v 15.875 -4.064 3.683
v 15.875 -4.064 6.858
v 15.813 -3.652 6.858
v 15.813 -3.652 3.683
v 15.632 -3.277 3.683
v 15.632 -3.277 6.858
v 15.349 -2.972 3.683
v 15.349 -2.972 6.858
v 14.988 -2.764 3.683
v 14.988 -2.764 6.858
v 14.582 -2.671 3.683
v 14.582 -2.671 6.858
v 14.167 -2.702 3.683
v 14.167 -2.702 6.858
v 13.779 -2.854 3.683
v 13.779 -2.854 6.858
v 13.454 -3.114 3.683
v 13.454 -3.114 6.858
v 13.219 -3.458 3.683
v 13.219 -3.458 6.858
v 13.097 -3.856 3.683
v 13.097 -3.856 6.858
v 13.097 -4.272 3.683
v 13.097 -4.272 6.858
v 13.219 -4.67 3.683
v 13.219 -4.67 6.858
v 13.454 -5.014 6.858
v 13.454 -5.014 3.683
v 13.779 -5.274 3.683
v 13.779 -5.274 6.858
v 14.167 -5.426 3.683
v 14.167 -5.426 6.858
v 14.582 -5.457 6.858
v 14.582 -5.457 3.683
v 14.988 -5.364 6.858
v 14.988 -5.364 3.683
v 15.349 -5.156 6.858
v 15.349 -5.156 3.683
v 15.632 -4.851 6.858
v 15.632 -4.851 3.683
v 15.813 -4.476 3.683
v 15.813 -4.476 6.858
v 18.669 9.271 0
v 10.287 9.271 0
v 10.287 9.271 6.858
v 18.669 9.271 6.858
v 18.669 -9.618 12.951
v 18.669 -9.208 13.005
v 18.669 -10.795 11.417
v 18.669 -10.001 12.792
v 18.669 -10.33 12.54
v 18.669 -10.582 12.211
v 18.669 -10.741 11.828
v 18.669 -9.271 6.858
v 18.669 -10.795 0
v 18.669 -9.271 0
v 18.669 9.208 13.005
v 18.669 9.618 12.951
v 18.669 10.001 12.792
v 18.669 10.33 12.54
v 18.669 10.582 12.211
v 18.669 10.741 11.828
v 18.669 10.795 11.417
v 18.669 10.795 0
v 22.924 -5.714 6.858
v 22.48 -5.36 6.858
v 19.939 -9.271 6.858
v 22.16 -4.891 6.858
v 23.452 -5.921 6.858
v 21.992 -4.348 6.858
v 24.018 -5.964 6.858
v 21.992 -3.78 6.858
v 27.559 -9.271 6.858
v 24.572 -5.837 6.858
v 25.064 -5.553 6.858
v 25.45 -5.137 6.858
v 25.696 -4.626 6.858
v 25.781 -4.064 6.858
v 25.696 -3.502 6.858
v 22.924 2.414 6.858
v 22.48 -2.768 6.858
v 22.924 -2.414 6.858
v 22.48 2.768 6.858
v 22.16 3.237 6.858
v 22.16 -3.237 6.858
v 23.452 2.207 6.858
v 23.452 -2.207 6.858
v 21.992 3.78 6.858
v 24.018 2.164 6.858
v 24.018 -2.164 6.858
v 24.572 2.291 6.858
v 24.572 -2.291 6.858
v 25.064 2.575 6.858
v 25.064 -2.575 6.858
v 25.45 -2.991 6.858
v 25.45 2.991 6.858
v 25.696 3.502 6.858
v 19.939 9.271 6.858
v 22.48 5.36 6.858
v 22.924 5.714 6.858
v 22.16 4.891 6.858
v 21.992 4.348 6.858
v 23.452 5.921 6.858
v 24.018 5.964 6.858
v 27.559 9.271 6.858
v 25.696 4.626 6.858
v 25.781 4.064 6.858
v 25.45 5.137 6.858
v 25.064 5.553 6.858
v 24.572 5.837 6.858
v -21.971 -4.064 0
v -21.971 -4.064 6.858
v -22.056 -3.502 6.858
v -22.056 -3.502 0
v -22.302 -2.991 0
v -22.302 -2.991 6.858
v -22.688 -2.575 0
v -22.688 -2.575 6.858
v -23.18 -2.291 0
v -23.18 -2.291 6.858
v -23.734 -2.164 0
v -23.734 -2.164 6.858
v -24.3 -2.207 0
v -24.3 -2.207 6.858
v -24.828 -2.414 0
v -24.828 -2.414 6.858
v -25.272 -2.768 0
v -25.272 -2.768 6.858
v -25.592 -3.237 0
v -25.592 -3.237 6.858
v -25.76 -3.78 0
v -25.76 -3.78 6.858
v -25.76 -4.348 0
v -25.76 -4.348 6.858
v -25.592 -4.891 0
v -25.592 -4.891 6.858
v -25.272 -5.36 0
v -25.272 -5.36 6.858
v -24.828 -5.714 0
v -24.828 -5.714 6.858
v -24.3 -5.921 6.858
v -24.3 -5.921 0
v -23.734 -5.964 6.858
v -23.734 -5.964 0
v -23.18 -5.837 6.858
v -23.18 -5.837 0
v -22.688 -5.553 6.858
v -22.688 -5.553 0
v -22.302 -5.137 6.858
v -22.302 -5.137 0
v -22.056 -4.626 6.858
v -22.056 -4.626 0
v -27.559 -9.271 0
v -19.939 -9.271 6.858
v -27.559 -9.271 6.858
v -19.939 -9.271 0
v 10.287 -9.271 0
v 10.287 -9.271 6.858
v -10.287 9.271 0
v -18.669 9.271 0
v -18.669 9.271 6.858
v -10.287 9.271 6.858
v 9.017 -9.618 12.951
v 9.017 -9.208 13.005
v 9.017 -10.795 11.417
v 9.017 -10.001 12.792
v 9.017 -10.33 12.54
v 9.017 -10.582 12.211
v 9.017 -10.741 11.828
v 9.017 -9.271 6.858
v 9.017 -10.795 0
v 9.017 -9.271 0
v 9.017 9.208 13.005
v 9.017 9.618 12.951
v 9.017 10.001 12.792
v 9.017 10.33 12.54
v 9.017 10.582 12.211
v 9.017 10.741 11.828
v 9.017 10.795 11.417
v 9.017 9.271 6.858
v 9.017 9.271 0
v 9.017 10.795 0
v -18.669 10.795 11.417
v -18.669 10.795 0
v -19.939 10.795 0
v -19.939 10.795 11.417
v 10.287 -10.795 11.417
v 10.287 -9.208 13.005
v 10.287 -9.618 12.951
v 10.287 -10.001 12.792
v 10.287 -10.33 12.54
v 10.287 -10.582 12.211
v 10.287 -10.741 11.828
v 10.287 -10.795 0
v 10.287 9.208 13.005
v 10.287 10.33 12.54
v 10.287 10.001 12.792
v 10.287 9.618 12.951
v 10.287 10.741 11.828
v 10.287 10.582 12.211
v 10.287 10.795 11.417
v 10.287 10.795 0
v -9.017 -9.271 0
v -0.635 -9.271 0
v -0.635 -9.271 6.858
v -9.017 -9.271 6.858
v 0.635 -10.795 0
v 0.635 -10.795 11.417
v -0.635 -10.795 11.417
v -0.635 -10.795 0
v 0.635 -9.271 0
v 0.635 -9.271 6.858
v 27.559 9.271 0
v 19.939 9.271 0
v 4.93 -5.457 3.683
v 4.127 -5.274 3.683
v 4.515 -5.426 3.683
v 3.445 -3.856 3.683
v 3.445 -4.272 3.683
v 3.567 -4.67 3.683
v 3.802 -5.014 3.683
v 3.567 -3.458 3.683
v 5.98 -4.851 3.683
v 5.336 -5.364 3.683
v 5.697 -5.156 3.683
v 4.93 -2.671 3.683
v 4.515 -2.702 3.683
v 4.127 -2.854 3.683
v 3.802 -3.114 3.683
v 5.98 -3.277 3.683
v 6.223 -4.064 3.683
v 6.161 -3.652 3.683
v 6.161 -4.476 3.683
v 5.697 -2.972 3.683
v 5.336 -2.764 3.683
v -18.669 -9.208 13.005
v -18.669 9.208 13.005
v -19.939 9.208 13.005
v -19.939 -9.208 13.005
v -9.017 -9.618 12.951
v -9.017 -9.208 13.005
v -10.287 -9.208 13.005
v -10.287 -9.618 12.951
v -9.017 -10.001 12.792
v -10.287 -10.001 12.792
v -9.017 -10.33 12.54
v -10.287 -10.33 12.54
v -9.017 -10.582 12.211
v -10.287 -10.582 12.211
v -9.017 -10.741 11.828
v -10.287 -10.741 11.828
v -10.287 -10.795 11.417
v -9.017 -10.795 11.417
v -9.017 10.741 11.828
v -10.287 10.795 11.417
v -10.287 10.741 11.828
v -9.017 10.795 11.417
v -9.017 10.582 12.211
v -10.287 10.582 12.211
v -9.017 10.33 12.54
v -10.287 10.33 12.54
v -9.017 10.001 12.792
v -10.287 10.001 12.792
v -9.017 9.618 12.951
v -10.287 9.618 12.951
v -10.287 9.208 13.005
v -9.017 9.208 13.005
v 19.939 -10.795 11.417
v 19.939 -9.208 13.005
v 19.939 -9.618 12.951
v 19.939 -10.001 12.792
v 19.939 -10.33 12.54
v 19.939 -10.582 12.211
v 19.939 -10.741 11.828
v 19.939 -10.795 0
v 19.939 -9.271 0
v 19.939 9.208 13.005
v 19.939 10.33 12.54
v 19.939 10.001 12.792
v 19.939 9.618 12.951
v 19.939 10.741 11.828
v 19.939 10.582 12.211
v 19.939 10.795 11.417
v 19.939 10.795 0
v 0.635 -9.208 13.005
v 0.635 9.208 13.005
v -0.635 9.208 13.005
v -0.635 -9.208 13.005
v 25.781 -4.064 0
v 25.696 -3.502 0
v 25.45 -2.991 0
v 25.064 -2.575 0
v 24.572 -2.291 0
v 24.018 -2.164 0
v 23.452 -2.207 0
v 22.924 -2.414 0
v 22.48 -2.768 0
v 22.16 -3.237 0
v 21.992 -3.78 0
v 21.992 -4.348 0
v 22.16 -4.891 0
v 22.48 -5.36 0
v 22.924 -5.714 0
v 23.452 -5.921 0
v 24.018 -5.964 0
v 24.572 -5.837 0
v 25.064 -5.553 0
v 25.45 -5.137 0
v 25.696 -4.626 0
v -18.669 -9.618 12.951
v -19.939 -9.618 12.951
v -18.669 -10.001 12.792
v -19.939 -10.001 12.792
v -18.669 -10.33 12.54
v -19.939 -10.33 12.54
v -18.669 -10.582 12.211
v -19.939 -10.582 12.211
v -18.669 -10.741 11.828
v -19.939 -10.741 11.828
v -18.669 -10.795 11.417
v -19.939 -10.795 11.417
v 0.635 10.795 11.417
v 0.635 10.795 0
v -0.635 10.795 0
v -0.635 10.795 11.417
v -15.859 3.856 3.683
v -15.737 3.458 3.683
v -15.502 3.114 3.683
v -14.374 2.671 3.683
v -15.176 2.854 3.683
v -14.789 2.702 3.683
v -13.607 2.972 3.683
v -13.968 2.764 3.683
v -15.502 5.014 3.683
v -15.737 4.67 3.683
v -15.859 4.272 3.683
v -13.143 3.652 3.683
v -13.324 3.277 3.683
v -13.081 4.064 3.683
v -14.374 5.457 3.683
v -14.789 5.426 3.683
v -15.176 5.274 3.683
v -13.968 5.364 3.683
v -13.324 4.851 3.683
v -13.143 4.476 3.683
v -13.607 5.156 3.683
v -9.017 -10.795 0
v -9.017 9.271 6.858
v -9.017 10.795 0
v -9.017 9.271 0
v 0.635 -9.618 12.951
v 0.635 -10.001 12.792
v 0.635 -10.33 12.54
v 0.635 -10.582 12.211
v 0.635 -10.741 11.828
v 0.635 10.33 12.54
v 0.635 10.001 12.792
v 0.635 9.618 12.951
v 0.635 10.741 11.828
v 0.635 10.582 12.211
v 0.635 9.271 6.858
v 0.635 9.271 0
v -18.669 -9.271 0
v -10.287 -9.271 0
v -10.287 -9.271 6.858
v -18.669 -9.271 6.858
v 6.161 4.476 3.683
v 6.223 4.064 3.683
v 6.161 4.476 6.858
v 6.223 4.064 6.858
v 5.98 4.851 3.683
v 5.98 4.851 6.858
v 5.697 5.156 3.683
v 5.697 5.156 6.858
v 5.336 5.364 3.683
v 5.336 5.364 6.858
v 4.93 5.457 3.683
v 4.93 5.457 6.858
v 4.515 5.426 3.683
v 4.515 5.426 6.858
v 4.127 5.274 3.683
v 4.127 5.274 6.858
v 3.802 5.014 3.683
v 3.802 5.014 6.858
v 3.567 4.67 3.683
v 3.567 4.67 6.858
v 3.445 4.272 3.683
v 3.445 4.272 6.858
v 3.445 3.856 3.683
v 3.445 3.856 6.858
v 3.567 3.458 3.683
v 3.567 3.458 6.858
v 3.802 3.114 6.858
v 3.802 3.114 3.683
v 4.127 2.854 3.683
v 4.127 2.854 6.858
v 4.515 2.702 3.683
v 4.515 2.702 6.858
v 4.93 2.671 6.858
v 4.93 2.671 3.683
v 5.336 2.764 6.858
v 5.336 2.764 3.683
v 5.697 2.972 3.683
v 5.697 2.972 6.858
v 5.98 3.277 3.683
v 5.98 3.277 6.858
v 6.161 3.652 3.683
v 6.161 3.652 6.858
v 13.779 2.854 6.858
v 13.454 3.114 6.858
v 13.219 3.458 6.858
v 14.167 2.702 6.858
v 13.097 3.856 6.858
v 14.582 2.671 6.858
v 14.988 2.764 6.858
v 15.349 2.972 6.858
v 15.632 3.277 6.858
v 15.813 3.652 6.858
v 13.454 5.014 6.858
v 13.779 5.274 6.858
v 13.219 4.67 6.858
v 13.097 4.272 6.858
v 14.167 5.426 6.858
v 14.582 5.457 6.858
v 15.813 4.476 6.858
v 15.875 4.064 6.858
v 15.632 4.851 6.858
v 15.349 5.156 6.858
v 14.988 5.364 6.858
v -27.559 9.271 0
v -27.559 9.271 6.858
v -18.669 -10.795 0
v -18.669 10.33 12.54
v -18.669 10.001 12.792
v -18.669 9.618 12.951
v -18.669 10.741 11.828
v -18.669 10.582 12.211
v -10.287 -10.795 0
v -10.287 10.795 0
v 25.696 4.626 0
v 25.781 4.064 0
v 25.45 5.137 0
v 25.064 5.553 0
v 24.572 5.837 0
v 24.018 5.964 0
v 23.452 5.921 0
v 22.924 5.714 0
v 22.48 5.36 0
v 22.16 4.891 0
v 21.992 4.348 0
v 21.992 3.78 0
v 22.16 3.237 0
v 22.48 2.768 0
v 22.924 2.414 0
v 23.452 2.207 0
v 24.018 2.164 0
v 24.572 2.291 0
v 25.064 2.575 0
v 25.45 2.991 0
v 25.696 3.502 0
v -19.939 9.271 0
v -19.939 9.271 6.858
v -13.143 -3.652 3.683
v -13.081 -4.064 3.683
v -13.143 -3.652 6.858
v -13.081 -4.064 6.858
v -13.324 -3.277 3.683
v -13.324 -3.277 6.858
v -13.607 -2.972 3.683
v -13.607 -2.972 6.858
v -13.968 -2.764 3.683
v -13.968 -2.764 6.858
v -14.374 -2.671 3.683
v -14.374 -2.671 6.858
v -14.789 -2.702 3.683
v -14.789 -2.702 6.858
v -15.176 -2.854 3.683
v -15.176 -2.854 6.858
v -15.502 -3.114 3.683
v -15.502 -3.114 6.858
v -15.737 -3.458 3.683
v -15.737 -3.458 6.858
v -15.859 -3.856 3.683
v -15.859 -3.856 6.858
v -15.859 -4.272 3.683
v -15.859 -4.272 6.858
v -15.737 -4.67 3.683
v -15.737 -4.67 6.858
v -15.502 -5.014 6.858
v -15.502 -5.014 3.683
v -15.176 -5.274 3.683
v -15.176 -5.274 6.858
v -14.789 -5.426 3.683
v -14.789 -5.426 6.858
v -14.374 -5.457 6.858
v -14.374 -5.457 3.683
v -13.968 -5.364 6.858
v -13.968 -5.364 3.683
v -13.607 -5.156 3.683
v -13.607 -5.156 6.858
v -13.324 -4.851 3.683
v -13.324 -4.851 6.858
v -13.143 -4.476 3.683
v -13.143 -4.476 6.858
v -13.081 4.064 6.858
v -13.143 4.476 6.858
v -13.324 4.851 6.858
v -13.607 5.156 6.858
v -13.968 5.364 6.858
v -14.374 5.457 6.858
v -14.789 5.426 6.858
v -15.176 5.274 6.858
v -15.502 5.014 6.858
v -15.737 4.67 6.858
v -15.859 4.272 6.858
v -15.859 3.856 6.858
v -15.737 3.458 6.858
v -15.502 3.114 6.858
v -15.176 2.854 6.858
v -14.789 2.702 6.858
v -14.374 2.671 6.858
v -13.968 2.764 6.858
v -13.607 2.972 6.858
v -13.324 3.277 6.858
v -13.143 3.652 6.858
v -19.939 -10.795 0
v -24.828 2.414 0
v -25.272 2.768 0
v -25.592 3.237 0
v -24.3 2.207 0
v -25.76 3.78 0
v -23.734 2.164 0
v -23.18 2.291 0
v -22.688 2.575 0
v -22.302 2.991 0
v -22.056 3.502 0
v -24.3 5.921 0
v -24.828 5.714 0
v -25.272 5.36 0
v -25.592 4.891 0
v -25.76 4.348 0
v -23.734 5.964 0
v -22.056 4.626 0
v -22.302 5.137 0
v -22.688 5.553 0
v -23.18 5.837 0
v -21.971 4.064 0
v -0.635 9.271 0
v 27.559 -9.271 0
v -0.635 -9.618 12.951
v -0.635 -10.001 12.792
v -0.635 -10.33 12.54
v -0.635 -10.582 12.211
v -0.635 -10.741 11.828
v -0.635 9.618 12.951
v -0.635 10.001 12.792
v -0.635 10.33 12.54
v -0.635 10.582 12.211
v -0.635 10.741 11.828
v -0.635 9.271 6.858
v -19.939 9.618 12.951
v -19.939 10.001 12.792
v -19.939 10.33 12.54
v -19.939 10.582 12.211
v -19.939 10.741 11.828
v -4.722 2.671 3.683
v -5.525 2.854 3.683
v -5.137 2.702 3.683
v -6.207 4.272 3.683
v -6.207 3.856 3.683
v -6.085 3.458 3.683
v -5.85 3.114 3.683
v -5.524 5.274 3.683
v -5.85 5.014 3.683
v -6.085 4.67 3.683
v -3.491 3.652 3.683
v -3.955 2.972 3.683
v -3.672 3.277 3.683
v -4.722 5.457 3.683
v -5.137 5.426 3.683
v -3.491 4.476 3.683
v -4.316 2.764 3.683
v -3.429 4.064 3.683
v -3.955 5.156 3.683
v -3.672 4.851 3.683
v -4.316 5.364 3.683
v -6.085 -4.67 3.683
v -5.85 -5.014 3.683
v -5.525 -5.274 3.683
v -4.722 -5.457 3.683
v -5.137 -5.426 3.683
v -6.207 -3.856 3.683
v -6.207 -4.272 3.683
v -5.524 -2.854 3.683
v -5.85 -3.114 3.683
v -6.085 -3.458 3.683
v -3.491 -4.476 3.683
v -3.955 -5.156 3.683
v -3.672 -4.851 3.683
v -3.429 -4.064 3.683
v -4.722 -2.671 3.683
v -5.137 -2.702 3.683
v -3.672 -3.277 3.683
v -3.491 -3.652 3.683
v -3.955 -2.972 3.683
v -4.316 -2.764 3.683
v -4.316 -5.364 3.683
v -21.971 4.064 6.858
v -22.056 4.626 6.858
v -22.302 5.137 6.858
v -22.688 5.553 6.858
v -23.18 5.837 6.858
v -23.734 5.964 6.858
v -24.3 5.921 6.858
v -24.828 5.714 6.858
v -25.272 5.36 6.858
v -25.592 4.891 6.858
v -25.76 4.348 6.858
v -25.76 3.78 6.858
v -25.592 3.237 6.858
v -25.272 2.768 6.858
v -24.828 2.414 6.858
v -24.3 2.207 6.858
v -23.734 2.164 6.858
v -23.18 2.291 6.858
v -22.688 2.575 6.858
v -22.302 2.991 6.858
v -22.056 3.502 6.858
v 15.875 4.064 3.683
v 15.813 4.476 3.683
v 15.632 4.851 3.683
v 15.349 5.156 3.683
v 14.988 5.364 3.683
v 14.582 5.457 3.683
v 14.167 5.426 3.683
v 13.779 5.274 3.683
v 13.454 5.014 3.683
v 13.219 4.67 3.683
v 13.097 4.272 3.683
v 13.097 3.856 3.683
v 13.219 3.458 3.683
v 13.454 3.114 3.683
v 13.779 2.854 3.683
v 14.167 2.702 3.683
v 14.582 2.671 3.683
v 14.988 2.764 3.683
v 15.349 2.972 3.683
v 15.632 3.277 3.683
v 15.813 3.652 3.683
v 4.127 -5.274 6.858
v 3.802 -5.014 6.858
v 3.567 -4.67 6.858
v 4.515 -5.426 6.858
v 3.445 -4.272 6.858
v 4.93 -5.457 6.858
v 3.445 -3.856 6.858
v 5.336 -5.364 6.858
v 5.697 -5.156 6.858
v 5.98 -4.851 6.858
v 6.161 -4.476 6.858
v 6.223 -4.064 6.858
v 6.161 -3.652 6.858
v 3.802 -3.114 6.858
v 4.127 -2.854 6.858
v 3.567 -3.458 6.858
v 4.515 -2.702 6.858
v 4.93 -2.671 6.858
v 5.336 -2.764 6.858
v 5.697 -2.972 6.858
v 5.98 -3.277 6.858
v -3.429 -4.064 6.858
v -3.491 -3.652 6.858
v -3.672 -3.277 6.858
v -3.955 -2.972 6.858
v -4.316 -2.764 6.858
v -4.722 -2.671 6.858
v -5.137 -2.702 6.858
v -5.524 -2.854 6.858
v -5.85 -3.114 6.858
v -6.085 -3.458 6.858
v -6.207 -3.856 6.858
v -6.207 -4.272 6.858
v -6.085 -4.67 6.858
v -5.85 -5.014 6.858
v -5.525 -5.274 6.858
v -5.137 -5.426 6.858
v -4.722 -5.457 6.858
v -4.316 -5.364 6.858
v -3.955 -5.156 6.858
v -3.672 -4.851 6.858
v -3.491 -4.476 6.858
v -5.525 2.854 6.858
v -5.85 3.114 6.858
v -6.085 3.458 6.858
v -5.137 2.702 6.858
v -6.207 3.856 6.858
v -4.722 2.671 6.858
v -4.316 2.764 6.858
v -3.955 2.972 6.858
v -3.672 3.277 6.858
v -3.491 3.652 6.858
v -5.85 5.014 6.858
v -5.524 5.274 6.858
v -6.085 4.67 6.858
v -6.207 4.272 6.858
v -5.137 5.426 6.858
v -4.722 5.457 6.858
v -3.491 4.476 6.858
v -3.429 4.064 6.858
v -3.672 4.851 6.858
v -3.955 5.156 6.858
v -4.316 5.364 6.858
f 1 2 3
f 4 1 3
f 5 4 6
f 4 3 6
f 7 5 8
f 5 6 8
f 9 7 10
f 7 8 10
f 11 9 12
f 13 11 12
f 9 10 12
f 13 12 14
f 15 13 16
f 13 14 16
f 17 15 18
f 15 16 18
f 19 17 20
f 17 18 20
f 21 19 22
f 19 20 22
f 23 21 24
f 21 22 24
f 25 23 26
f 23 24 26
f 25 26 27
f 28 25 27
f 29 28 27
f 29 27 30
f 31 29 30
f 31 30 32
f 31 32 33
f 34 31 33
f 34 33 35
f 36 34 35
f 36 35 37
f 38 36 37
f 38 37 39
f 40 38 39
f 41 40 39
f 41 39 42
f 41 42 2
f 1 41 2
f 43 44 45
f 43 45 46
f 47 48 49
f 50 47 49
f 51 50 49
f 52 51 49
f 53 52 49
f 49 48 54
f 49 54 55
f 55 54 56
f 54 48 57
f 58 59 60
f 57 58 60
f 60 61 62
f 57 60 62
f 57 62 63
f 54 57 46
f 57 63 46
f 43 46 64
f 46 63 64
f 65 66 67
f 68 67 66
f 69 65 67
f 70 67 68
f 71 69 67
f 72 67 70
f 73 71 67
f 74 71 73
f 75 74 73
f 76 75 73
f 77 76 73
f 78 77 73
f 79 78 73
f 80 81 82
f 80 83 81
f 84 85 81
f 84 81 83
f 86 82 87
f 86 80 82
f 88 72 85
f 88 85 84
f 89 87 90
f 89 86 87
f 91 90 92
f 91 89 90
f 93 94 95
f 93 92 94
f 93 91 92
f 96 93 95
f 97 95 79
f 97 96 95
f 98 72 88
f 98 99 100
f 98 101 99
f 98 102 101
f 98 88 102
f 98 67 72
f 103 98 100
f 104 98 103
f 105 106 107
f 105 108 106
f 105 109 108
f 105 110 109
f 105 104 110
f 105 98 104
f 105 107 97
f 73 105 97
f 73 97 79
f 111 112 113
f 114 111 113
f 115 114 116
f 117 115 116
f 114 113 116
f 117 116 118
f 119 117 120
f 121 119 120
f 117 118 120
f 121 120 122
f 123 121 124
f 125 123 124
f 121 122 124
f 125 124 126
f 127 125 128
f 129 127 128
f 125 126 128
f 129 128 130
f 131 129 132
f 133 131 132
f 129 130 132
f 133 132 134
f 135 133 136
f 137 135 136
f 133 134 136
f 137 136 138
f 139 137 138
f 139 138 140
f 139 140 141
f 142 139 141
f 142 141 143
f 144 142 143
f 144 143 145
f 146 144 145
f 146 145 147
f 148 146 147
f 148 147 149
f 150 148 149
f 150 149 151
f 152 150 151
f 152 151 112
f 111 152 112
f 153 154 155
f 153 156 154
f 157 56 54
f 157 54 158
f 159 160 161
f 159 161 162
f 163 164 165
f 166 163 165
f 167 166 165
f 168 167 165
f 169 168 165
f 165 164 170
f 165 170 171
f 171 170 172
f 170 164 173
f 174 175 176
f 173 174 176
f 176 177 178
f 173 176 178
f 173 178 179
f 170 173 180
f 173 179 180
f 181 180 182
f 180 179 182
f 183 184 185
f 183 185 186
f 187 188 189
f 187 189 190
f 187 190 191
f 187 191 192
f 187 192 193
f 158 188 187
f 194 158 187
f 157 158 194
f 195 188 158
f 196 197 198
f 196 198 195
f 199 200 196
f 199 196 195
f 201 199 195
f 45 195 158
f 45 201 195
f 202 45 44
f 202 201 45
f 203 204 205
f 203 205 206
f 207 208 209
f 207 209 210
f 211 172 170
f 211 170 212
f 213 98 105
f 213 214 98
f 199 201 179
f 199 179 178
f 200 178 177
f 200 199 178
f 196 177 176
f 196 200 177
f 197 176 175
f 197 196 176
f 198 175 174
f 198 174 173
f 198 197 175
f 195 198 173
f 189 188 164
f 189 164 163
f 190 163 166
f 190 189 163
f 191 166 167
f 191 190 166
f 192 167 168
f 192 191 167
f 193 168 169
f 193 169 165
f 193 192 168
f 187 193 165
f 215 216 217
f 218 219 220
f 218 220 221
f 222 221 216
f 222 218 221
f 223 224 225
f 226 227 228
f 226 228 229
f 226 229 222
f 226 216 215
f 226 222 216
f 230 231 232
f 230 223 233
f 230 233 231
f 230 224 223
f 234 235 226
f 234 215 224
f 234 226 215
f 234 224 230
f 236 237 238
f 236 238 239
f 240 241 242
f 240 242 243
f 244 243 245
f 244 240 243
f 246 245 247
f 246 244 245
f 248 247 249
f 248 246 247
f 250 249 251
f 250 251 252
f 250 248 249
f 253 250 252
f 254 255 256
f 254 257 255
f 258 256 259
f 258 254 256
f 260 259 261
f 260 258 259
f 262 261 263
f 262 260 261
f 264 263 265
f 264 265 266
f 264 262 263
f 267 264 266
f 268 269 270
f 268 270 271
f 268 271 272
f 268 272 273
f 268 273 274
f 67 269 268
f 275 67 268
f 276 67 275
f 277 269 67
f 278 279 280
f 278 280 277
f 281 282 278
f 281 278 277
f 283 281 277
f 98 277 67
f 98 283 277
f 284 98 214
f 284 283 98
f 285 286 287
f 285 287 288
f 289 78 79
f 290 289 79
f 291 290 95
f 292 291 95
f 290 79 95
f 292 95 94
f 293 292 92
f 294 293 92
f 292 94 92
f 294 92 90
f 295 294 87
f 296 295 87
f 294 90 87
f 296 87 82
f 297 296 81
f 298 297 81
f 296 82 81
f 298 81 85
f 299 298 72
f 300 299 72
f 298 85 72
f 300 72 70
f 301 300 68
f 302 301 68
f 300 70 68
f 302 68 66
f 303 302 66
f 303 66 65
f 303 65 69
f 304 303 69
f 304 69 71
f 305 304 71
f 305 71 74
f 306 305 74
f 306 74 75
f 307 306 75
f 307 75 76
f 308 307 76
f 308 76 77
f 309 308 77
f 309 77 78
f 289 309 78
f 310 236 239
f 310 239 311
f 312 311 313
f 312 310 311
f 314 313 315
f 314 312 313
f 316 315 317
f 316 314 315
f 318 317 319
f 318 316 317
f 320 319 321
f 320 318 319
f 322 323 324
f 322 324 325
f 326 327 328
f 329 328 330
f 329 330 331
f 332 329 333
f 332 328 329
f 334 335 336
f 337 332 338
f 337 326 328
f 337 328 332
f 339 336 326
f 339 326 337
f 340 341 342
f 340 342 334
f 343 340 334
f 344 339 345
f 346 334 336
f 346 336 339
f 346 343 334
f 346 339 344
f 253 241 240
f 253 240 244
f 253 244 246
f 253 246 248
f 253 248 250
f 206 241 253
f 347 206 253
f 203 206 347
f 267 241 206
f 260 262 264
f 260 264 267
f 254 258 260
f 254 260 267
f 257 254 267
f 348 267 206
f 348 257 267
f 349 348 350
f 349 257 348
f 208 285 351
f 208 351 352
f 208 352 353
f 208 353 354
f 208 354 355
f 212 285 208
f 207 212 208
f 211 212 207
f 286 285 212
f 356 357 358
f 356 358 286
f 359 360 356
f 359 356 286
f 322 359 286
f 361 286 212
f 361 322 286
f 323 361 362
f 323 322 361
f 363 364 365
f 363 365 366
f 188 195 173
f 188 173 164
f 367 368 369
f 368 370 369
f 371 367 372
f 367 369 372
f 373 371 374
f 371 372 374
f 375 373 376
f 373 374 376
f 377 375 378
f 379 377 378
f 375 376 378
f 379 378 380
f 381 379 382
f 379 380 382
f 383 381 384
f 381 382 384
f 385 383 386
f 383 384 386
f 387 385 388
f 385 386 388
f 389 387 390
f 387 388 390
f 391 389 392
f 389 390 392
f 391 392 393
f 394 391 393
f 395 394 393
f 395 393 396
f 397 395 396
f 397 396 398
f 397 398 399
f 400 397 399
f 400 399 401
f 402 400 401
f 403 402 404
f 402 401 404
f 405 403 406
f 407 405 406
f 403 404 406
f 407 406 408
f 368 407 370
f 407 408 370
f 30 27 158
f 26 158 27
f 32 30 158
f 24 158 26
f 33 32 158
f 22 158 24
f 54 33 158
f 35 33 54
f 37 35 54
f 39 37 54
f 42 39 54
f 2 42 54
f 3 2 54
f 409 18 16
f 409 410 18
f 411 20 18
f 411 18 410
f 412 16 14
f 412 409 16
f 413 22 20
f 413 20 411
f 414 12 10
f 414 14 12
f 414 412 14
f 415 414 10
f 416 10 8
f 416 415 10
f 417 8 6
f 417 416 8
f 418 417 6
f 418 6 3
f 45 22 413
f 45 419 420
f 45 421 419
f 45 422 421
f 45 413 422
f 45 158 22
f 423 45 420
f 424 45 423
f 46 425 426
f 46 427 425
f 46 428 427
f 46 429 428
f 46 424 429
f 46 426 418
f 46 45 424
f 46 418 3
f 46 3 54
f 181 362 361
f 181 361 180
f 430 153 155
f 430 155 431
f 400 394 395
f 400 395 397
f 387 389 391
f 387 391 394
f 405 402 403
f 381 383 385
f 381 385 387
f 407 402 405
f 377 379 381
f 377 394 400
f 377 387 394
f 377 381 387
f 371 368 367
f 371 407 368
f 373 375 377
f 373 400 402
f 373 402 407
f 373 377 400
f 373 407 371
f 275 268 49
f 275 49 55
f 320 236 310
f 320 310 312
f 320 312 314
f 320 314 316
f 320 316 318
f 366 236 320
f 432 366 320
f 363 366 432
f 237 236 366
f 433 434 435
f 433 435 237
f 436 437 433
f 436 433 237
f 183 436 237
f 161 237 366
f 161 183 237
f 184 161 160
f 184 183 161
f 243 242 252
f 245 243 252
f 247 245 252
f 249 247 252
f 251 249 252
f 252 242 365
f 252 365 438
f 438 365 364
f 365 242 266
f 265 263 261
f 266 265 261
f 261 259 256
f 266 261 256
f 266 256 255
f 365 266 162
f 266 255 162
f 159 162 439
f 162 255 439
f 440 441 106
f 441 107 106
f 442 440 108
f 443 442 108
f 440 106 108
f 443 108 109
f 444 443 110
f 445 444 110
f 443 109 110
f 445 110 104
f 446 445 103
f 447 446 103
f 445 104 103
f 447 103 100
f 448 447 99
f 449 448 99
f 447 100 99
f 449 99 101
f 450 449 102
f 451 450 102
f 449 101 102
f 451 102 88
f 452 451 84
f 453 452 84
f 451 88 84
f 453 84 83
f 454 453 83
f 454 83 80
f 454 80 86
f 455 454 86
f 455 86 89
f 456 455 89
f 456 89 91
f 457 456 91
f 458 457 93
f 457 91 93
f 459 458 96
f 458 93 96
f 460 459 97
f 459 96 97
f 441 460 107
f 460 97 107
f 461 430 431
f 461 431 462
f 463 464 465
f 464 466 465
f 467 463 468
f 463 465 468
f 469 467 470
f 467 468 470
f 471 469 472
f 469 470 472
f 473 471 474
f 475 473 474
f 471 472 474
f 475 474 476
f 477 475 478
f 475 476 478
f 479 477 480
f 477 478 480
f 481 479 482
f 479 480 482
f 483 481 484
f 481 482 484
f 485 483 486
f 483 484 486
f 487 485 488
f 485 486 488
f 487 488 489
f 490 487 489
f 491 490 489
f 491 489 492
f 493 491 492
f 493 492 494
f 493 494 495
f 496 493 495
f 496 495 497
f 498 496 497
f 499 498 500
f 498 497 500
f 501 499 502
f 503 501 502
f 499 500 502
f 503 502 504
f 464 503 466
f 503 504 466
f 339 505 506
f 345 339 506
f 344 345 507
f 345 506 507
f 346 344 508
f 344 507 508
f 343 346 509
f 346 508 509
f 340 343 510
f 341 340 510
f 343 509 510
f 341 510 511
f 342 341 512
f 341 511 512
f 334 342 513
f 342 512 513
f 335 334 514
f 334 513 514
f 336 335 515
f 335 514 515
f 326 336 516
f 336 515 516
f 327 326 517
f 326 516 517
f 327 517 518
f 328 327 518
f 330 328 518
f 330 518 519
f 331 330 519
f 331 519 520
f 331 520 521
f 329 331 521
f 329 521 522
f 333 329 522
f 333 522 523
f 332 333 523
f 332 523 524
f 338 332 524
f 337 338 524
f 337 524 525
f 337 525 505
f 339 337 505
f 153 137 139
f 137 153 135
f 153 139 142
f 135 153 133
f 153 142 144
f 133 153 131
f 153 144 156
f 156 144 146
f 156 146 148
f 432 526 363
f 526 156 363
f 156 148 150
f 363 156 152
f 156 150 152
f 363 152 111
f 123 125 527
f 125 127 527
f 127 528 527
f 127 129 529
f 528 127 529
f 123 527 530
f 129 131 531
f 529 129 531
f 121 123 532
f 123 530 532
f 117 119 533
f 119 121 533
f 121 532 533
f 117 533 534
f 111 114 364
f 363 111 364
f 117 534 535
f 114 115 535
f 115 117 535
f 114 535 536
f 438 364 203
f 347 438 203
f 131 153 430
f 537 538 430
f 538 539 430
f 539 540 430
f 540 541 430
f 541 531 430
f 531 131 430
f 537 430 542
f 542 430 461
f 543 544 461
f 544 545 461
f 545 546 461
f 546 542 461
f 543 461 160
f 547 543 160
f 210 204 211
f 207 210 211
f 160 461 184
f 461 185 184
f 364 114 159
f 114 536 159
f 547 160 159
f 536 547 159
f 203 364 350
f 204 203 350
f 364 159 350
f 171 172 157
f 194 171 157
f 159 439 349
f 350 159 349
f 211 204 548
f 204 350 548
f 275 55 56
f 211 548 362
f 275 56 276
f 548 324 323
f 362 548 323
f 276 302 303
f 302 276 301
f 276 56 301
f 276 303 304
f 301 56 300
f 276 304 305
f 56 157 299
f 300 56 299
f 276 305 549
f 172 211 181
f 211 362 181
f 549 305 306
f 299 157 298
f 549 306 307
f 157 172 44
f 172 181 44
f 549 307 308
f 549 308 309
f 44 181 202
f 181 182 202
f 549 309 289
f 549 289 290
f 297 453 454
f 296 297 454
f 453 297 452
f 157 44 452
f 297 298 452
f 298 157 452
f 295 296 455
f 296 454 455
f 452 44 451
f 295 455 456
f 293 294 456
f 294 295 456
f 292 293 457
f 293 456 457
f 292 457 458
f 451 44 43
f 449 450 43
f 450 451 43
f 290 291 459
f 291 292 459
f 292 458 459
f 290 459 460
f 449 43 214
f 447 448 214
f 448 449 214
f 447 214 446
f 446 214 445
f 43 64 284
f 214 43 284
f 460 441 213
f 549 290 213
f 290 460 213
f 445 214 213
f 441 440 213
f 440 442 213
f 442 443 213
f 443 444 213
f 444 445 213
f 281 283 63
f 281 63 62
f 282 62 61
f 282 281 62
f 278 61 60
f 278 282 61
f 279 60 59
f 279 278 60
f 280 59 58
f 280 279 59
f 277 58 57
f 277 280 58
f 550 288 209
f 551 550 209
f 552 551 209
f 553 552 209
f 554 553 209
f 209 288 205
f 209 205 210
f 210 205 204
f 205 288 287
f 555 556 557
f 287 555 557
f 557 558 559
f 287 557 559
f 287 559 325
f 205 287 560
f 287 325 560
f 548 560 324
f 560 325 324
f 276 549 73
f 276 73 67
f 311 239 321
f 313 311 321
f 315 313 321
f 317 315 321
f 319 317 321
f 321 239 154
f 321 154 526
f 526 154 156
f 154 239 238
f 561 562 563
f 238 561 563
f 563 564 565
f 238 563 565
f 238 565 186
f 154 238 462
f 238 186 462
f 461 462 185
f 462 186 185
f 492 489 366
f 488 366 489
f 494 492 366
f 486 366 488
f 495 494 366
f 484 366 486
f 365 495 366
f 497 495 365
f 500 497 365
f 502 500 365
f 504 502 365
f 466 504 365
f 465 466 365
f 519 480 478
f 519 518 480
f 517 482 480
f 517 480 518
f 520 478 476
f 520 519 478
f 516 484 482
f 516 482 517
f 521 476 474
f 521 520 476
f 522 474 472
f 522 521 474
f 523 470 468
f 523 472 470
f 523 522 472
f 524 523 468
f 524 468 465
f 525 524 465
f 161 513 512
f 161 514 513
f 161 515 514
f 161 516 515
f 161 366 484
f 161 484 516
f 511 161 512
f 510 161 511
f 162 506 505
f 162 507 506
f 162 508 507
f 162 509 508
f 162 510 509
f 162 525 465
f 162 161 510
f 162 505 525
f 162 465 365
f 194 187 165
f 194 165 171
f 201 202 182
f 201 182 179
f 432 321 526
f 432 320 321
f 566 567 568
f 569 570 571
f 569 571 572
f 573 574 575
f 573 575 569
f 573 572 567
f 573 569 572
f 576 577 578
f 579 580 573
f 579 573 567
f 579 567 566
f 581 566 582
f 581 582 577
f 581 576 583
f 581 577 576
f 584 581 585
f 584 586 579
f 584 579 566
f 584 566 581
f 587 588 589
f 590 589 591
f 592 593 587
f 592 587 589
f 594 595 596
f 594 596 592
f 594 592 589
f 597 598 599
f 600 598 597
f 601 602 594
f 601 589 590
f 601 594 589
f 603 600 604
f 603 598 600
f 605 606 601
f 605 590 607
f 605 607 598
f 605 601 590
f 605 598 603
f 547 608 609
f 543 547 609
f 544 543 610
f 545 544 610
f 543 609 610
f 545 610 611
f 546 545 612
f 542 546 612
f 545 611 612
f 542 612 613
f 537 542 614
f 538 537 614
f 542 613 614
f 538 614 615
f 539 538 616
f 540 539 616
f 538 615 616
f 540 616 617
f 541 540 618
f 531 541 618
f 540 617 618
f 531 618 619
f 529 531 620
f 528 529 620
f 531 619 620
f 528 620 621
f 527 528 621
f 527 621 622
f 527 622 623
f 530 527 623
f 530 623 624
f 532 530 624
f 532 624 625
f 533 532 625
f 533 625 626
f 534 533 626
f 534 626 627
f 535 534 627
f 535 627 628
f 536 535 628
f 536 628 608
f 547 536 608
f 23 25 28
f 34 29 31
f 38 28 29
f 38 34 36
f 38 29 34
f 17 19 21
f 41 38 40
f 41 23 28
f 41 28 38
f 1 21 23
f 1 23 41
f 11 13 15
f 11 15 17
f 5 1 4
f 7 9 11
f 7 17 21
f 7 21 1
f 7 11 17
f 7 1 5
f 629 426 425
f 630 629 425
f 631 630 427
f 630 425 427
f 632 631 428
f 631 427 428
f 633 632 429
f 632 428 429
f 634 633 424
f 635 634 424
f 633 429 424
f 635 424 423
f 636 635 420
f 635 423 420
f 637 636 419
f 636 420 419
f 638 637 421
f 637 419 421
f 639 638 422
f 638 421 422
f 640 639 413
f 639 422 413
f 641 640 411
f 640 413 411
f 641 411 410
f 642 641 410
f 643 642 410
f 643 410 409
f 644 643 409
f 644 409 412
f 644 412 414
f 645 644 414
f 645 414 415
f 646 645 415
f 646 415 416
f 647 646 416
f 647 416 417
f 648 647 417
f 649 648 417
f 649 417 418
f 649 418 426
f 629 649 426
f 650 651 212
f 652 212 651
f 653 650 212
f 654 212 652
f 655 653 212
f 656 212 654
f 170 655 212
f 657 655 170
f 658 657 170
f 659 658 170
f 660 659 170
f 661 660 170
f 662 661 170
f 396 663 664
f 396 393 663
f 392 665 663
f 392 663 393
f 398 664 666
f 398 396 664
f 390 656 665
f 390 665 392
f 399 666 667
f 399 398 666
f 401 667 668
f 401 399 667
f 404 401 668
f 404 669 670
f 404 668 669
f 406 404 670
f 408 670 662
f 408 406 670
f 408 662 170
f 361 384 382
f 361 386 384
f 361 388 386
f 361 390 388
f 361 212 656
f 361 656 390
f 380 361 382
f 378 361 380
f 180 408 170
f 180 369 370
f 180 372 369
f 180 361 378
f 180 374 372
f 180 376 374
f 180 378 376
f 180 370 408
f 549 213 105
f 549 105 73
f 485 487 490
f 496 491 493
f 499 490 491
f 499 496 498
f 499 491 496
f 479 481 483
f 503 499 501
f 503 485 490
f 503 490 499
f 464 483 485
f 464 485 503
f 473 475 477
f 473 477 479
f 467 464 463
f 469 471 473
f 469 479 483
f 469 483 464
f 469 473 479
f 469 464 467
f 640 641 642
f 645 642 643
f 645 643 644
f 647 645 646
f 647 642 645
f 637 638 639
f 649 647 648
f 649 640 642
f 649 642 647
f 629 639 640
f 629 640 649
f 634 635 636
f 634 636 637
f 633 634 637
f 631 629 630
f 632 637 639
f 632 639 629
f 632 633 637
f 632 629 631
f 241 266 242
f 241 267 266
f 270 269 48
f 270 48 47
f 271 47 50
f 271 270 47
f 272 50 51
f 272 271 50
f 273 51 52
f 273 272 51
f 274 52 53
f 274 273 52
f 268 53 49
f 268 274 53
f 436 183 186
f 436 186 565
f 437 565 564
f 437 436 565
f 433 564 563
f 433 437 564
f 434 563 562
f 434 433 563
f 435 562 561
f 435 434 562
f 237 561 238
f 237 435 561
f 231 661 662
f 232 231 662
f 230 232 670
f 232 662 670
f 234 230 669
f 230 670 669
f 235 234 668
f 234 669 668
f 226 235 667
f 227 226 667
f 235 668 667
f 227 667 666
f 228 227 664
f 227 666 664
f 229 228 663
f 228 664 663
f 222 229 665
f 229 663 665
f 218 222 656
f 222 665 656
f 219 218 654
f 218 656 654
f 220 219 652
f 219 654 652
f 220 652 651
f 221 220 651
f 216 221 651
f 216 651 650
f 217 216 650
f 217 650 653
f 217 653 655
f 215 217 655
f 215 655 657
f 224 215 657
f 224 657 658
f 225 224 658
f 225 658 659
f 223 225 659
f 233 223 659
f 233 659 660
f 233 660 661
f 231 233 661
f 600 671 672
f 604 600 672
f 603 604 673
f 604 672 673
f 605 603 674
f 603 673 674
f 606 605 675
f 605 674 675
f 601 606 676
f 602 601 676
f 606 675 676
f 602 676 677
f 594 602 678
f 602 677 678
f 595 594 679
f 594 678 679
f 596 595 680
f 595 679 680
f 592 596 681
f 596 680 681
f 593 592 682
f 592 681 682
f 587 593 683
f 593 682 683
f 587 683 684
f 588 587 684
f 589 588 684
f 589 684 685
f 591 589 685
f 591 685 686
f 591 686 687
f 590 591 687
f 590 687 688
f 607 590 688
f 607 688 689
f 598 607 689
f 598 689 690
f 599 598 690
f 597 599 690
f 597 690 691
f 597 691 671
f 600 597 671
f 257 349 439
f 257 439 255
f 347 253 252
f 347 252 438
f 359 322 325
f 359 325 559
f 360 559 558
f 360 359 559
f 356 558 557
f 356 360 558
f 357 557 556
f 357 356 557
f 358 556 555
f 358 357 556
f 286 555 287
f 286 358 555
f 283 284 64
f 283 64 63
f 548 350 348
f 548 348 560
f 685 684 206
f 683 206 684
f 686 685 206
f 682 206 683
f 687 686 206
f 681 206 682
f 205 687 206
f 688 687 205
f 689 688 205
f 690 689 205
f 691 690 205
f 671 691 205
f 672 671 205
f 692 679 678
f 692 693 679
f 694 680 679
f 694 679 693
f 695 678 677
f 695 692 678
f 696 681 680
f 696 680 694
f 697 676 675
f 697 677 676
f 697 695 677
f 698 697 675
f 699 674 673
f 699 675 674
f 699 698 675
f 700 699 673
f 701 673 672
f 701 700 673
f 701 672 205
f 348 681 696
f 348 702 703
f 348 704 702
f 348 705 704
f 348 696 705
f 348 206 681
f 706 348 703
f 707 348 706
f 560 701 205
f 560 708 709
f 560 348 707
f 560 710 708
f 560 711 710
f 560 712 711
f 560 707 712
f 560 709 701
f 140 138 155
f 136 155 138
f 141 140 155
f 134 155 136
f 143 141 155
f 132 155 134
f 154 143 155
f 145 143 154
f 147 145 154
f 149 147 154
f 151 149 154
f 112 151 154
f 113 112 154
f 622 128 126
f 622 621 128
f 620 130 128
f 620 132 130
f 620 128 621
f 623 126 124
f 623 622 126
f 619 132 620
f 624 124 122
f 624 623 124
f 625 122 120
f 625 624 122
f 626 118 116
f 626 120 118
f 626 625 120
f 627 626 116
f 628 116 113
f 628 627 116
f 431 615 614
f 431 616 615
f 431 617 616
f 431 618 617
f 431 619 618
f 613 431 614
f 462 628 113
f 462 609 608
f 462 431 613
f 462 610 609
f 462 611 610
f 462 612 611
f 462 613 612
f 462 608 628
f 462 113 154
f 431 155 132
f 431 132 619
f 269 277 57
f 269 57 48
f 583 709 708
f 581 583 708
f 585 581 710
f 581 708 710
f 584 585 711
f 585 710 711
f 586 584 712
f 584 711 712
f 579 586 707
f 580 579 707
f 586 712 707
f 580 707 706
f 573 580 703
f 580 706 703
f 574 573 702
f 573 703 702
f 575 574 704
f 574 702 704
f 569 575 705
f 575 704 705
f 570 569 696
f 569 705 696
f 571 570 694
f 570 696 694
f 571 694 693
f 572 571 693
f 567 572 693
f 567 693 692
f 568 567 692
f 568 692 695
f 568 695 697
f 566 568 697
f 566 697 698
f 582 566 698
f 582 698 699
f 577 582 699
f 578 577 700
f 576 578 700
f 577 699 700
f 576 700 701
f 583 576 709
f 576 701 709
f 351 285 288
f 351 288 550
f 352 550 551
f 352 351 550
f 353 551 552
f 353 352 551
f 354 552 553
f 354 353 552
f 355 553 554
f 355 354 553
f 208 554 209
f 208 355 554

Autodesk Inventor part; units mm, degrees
ref_plane "YZ Plane" through (0, 0, 0) normal (1, 0, 0) x (0, 1, 0)
ref_plane "XZ Plane" through (0, 0, 0) normal (0, 1, 0) x (-1, 0, 0)
sketch "Sketch1" plane through (0, 0, 0) normal (0, 0, 1) x (1, 0, 0)
  line L0 (-27.559, 9.271) -> (27.559, 9.271)
  line L1 (27.559, 9.271) -> (27.559, -9.271)
  line L2 (27.559, -9.271) -> (-27.559, -9.271)
  line L3 (-27.559, -9.271) -> (-27.559, 9.271)
  line L4 (-27.559, 9.271) -> (27.559, -9.271) construction
  point P0 (0, 0)
  point P1 (0, 0)
  dimension "d0" = 55.118
  dimension "d1" = 18.542
extrude "Extrusion1" add sketch "Sketch1" along normal blind 6.858
sketch "Sketch2" plane through (0, 0, 6.858) normal (0, 0, 1) x (1, 0, 0)
  line L0 (27.559, -9.271) -> (-27.559, -9.271) projected
  circle A0 centre (-23.876, 4.064) radius 1.905
  circle A1 centre (-23.876, -4.064) radius 1.905
  circle A2 centre (23.876, 4.064) radius 1.905
  circle A3 centre (23.876, -4.064) radius 1.905
  line L1 (-23.876, 4.064) -> (-23.876, -4.064) construction
  line L2 (-23.876, -4.064) -> (23.876, -4.064) construction
  line L3 (23.876, -4.064) -> (23.876, 4.064) construction
  line L4 (23.876, 4.064) -> (-23.876, 4.064) construction
  line L5 (-23.876, 4.064) -> (23.876, -4.064) construction
  point P0 (0, 0)
  point P1 (0, 0)
  dimension "d4" = 3.81
  dimension "d5" = 4.318
  dimension "d6" = 43.942
extrude "Extrusion2" cut sketch "Sketch2" against normal up to surface (6.858 mm away)
ref_plane "Work Plane1" through (19.939, -9.271, 0) normal (1, 0, 0) x (0, 0, -1)
sketch "Sketch3" plane through (19.939, -9.271, 0) normal (1, 0, 0) x (0, 0, -1)
  line L0 (0, 20.066) -> (-11.4173, 20.066)
  line L1 (-13.0048, 18.4785) -> (-13.0048, 0.0635)
  line L2 (-11.4173, -1.524) -> (0, -1.524)
  line L3 (0, -1.524) -> (0, 0)
  line L4 (0, 0) -> (-6.858, 0)
  line L5 (-6.858, 0) -> (-6.858, 18.542)
  line L6 (-6.858, 18.542) -> (0, 18.542)
  line L7 (0, 18.542) -> (0, 20.066)
  line L8 (0, 18.542) -> (0, 0) projected
  line L9 (-6.858, 18.542) -> (-6.858, 0) projected
  arc A0 (-11.4173, 20.066) -> (-13.0048, 18.4785) centre (-11.4173, 18.4785) ccw
  arc A1 (-13.0048, 0.0635) -> (-11.4173, -1.524) centre (-11.4173, 0.0635) ccw
  point P0 (0, 9.271)
  dimension "d10" = 1.524
  dimension "d11" = 13.0048
  dimension "d12" = 1.5875
extrude "Extrusion3" add sketch "Sketch3" against normal blind 1.27 contours L7 L6 L5 L4 L3 L2 A1 L1 A0 L0
pattern_linear "Rectangular Pattern1" count 5 spacing 9.652 along (-1, 0, 0) of "Extrusion3"
sketch "Sketch4" plane through (0, 0, 6.858) normal (0, 0, 1) x (1, 0, 0)
  line L0 (-18.669, 9.2075) -> (-18.669, -9.2075) projected
  line L1 (-10.287, 9.2075) -> (-10.287, -9.2075) projected
  line L2 (-9.017, 9.2075) -> (-9.017, -9.2075) projected
  line L3 (-0.635, 9.2075) -> (-0.635, -9.2075) projected
  line L4 (0.635, 9.2075) -> (0.635, -9.2075) projected
  line L5 (9.017, 9.2075) -> (9.017, -9.2075) projected
  line L6 (10.287, 9.2075) -> (10.287, -9.2075) projected
  line L7 (18.669, 9.2075) -> (18.669, -9.2075) projected
  line L8 (19.939, 9.2075) -> (19.939, -9.2075) projected
  circle A0 centre (-14.478, 4.064) radius 1.397
  circle A1 centre (-14.478, -4.064) radius 1.397
  line L9 (-14.478, 4.064) -> (-14.478, -4.064) construction
  line L10 (-37.6243, 0) -> (37.6243, 0) construction
  circle A2 centre (-4.826, 4.064) radius 1.397
  circle A3 centre (-4.826, -4.064) radius 1.397
  circle A4 centre (4.826, 4.064) radius 1.397
  circle A5 centre (4.826, -4.064) radius 1.397
  circle A6 centre (14.478, 4.064) radius 1.397
  circle A7 centre (14.478, -4.064) radius 1.397
  point P0 (0, 0)
  point P1 (0, 0)
  point P2 (-14.478, 0)
  dimension "d18" = 2.794
  dimension "d19" = 5.334
  dimension "d21" = 4.191
  dimension "d28" = 9.652
extrude "Extrusion4" cut sketch "Sketch4" against normal blind 3.175
sketch "Sketch5" plane through (0, 0, 6.858) normal (0, 0, 1) x (1, 0, 0)
  circle A0 centre (-14.478, -4.064) radius 1.397 projected
sketch "Sketch6" plane through (0, 0, 6.858) normal (0, 0, 1) x (1, 0, 0)
  circle A0 centre (-14.478, 4.064) radius 1.397 projected
sketch "Sketch7" plane through (0, 0, 6.858) normal (0, 0, 1) x (1, 0, 0)
  circle A0 centre (-4.826, -4.064) radius 1.397 projected
sketch "Sketch8" plane through (0, 0, 6.858) normal (0, 0, 1) x (1, 0, 0)
  circle A0 centre (-4.826, 4.064) radius 1.397 projected
sketch "Sketch9" plane through (0, 0, 6.858) normal (0, 0, 1) x (1, 0, 0)
  circle A0 centre (4.826, 4.064) radius 1.397 projected
sketch "Sketch10" plane through (0, 0, 6.858) normal (0, 0, 1) x (1, 0, 0)
  circle A0 centre (14.478, -4.064) radius 1.397 projected
sketch "Sketch11" plane through (0, 0, 6.858) normal (0, 0, 1) x (1, 0, 0)
  circle A0 centre (23.876, 4.064) radius 1.905 projected
sketch "Sketch12" plane through (0, 0, 6.858) normal (0, 0, 1) x (1, 0, 0)
  circle A0 centre (23.876, -4.064) radius 1.905 projected
properties part number "Terminal Block"
